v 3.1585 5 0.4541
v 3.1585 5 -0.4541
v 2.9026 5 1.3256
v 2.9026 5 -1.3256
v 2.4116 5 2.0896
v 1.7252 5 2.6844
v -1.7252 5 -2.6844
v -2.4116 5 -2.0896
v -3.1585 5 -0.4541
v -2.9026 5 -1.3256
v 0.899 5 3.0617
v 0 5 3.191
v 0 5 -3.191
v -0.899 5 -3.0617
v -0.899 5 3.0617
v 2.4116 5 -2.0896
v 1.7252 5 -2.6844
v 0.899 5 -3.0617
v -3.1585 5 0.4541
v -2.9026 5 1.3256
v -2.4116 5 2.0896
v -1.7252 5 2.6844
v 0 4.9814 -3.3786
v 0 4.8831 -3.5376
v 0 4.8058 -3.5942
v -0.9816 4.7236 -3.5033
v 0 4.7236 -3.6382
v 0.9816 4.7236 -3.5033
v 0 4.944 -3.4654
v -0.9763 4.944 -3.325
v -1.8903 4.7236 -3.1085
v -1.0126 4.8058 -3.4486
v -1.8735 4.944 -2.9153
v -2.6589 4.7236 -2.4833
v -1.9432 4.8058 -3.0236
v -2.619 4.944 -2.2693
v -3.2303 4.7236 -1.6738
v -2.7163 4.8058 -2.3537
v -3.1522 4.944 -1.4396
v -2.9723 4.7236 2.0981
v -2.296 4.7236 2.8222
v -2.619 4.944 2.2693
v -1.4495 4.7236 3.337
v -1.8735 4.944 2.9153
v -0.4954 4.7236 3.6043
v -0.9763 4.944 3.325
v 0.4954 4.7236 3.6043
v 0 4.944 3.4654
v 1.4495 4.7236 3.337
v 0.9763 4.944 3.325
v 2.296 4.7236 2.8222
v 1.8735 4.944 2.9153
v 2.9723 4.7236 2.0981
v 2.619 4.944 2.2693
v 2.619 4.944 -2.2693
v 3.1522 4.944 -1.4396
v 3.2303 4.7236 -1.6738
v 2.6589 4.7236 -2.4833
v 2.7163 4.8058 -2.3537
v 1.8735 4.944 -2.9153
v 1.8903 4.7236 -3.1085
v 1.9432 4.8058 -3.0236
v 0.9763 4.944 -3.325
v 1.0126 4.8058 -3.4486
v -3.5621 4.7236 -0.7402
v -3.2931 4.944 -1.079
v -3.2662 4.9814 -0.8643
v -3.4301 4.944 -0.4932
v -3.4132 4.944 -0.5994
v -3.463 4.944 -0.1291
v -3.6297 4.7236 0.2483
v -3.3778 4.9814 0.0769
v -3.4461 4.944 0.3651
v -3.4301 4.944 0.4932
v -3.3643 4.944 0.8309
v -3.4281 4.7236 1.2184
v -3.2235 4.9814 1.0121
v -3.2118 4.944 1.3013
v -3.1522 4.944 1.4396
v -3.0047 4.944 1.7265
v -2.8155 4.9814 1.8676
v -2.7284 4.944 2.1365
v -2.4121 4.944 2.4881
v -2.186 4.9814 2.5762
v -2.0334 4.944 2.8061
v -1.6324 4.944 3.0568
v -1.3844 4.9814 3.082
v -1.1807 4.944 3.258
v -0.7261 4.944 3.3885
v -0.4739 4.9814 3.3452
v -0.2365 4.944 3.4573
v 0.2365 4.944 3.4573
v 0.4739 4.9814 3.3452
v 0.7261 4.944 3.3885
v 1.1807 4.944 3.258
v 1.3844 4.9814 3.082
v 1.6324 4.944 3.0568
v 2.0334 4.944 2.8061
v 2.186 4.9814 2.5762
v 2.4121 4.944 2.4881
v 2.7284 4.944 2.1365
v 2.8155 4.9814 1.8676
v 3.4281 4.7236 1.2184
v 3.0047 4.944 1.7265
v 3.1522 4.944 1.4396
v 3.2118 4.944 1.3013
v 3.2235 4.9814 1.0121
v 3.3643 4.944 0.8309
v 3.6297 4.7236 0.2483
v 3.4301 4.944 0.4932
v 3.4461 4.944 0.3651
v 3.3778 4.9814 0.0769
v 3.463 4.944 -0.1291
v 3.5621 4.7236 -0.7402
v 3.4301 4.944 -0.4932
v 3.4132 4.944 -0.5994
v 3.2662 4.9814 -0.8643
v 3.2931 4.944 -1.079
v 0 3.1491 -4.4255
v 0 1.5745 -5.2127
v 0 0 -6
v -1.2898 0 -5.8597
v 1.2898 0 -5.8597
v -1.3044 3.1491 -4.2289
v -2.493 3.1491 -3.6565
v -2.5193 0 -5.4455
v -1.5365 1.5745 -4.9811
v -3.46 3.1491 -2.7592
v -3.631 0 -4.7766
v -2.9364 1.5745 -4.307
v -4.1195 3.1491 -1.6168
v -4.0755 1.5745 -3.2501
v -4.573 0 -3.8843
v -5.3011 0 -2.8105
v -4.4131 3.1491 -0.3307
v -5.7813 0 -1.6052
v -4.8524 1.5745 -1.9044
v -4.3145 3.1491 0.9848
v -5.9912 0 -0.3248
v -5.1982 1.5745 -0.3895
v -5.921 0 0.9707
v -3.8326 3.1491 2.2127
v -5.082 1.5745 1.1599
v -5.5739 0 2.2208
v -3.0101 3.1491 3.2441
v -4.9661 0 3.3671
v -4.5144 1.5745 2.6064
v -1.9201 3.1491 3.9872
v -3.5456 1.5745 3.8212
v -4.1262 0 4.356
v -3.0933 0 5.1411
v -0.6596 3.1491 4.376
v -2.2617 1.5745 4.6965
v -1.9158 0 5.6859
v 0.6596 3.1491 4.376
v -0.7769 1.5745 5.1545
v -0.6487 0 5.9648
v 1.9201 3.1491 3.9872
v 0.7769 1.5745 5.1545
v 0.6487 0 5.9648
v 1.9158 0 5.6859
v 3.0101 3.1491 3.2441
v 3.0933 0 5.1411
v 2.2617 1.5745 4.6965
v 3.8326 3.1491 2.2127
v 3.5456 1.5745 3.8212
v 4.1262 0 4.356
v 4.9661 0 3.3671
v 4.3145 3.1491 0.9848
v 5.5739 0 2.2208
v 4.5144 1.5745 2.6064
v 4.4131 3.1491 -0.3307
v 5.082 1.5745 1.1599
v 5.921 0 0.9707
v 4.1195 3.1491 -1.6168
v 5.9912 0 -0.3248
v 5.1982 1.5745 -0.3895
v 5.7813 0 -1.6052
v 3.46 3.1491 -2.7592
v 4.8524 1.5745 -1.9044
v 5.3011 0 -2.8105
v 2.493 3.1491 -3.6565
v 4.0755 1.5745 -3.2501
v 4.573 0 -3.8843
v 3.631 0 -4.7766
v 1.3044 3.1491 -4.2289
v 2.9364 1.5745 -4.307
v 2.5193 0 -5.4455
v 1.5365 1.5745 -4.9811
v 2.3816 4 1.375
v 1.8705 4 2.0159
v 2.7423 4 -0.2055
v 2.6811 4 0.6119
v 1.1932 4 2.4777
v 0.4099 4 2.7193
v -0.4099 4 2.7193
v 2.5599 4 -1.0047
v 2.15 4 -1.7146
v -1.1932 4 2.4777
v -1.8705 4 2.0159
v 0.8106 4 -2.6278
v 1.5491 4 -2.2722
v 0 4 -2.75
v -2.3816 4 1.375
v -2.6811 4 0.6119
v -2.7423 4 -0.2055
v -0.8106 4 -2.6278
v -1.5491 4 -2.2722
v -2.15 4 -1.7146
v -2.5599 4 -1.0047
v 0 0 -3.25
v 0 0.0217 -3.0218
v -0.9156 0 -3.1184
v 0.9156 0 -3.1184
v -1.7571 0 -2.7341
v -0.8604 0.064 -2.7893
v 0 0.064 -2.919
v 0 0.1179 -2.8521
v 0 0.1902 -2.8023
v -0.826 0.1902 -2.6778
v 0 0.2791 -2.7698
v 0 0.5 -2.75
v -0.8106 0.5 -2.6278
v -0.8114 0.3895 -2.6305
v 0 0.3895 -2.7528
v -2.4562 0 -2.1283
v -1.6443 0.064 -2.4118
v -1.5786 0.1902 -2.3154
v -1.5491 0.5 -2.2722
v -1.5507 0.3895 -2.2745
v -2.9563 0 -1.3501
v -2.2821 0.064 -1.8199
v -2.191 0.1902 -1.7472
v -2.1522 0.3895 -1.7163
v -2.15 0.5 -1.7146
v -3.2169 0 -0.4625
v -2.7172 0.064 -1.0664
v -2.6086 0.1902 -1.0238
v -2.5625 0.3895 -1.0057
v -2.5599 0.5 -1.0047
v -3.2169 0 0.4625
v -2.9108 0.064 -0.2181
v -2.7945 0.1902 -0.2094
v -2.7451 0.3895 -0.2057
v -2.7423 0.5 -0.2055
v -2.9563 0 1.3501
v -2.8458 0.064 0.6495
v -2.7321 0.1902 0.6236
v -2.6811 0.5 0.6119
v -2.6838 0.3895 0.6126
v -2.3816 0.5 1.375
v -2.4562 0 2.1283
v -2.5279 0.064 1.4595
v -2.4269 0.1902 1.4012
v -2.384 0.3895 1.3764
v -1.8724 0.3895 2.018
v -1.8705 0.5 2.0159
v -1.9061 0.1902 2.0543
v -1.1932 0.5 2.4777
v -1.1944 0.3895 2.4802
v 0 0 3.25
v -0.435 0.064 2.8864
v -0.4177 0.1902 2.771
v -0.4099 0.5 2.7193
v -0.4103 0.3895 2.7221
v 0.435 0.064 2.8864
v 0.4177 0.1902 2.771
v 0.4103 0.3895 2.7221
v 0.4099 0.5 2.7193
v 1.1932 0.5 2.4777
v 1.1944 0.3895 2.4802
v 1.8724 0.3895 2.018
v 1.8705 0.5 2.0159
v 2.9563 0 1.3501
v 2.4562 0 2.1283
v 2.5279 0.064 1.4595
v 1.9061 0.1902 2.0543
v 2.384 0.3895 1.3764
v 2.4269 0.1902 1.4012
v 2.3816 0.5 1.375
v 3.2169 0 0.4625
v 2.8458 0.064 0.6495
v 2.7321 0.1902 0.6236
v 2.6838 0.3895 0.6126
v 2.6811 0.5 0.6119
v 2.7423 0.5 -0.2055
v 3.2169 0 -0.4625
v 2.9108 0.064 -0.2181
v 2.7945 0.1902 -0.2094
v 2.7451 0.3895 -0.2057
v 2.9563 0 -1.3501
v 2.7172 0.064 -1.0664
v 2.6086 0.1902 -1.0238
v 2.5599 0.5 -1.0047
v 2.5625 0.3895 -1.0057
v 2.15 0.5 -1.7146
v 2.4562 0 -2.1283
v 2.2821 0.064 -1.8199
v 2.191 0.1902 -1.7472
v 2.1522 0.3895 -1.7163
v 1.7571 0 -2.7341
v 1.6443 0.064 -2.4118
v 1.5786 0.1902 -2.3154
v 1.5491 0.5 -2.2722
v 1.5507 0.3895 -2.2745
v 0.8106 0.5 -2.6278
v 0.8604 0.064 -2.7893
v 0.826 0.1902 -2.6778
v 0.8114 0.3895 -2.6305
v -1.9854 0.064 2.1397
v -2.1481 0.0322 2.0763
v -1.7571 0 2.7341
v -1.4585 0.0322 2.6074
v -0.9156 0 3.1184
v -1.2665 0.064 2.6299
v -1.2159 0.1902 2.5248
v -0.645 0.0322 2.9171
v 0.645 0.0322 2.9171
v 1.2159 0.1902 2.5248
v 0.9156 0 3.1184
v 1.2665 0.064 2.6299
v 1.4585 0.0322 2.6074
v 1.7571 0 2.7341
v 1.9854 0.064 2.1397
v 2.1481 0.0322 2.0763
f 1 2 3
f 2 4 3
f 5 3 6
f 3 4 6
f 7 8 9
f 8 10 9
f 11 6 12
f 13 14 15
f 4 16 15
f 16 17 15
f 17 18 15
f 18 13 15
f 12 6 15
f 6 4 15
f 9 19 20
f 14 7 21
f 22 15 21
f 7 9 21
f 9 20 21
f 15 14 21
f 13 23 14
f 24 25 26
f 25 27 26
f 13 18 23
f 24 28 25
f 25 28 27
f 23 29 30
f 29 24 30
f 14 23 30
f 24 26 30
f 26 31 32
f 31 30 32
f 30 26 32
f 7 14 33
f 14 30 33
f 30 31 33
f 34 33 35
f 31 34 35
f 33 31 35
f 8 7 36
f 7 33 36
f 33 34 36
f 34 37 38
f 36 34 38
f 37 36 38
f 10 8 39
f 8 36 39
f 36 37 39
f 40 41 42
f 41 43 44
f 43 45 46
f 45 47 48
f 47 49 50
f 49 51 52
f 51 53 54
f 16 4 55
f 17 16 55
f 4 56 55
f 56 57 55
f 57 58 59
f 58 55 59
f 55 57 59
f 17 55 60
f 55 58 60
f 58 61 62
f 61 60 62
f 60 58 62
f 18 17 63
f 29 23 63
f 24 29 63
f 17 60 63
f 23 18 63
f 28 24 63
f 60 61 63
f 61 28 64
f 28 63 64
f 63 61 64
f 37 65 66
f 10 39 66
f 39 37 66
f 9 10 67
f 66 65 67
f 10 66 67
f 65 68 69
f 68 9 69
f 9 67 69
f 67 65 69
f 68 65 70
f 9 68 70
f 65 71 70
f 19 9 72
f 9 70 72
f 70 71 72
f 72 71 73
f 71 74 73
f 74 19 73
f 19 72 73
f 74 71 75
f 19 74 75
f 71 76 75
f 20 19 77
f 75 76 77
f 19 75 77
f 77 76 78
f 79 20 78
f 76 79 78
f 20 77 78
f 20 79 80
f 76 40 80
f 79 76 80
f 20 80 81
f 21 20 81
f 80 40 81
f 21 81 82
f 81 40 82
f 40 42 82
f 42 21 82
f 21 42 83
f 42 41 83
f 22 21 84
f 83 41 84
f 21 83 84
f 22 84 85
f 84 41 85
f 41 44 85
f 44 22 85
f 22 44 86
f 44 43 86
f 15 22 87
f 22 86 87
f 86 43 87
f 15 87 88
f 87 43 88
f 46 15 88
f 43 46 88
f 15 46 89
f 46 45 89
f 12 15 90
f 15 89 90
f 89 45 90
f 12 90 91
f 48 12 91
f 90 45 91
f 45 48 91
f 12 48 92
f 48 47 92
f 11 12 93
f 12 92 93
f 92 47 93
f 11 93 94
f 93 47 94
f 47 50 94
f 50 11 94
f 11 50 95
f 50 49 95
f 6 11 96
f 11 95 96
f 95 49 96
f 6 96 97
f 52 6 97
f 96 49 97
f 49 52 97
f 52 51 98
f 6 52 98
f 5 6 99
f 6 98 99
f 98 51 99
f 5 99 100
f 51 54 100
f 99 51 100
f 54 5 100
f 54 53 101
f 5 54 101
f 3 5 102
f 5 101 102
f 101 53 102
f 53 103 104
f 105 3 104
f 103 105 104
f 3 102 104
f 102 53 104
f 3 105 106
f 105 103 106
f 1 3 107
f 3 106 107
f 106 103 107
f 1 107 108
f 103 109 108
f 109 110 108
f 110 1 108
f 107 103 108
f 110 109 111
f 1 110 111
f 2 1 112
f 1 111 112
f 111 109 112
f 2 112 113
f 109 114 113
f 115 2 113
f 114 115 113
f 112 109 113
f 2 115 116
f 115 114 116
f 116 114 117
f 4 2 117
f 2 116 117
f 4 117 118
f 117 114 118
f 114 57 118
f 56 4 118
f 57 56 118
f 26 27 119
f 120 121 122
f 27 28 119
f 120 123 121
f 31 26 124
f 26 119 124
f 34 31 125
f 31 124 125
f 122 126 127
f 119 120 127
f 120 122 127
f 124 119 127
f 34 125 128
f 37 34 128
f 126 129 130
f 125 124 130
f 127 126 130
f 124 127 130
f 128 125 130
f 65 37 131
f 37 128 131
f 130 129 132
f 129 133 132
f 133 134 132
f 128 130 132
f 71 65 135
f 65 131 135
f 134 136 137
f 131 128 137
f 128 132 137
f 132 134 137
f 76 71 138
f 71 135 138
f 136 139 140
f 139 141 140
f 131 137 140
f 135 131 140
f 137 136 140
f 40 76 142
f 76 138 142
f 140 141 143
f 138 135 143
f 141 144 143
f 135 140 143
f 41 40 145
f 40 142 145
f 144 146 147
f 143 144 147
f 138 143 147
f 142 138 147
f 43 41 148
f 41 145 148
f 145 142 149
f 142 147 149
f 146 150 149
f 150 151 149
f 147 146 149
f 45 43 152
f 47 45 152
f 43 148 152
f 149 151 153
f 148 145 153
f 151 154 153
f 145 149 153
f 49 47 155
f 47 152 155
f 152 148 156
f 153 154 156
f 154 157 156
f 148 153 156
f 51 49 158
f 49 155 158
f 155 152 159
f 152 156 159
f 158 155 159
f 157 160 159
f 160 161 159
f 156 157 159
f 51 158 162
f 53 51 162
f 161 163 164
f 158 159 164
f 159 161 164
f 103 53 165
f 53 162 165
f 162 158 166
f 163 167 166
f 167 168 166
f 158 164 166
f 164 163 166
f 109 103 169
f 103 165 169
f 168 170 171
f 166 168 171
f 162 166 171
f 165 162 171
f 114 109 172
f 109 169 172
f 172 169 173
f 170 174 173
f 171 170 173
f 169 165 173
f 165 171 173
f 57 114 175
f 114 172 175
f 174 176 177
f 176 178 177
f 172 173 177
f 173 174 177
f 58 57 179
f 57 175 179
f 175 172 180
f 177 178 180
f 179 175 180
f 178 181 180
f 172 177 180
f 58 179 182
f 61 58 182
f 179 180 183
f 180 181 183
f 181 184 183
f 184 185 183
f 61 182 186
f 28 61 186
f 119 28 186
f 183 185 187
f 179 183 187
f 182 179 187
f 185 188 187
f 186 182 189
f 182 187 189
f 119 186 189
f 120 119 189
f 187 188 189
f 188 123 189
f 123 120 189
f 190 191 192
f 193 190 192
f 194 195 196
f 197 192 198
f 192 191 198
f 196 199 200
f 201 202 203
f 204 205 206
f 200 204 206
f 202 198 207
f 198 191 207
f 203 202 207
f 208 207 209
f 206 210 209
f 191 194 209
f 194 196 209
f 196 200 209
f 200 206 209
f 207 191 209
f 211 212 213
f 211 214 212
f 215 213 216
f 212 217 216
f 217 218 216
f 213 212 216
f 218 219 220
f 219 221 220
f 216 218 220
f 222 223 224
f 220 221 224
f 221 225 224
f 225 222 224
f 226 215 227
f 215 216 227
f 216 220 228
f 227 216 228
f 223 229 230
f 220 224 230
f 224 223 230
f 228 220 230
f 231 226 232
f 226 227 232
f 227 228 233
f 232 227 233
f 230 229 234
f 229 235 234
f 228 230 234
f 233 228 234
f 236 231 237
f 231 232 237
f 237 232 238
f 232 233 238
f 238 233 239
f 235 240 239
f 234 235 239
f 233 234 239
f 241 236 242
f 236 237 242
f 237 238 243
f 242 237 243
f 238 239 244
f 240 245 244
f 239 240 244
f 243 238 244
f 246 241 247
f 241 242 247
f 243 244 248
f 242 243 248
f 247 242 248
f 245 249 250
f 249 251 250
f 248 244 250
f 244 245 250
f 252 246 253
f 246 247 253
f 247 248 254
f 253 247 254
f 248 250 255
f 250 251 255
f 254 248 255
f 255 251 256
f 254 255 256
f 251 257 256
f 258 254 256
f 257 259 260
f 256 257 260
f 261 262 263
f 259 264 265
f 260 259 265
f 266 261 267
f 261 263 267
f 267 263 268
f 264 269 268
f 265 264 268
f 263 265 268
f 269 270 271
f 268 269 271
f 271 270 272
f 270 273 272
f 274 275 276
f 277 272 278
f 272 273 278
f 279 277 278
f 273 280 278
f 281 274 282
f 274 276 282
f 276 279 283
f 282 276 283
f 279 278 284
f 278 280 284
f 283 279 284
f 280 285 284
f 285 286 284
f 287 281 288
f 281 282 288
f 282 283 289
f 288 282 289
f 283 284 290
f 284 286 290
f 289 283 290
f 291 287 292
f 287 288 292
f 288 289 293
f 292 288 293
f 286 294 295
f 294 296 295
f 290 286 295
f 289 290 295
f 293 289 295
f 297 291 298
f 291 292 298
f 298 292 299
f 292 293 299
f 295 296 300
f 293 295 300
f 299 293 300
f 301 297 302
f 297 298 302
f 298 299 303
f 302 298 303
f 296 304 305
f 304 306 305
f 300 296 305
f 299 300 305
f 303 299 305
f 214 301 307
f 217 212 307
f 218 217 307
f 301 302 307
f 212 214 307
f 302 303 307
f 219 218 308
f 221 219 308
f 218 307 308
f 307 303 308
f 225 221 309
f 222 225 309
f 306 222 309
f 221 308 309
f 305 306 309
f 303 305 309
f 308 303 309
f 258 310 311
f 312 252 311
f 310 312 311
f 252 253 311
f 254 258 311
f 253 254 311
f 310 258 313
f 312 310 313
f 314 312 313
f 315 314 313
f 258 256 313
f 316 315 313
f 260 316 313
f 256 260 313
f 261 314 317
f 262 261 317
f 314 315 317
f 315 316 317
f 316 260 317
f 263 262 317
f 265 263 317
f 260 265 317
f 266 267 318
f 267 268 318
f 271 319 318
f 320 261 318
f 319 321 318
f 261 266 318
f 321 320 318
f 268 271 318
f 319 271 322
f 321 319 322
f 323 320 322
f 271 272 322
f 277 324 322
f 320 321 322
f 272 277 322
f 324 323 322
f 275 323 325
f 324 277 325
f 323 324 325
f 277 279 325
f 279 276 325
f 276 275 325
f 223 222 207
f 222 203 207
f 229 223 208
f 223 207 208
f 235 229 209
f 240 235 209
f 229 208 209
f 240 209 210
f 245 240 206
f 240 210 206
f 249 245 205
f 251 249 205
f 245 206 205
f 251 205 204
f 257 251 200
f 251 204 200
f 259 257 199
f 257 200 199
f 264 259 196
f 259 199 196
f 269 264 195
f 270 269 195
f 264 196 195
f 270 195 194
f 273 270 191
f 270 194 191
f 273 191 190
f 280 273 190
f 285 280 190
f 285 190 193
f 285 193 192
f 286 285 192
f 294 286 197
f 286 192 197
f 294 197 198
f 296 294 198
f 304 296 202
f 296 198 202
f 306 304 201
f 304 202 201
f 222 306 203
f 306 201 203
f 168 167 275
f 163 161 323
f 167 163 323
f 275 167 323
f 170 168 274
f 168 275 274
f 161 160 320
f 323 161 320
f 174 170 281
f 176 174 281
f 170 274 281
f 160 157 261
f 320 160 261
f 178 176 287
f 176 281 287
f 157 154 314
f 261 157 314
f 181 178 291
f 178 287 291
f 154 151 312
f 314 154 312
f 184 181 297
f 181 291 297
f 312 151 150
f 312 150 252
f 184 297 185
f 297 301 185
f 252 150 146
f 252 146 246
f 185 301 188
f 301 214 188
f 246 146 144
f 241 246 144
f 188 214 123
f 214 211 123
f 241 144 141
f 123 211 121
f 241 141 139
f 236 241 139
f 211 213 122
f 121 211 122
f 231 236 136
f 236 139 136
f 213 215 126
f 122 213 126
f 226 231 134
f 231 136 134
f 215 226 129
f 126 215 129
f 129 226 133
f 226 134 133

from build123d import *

# Parameters (mm, degrees)
FILLET2_SIZE = 0.5


with BuildPart() as part:
    # Sketch1 → Revolve1 (revolve)
    with BuildSketch(Plane.XY, mode=Mode.PRIVATE) as revolve1_sk:
        Polygon((0, 5), (3.5, 5), (6, 0), (2.75, 0), (2.75, 4), (0, 4), align=None)
    revolve(revolve1_sk.sketch.rotate(Axis((0, 0, 0), (0, 1, 0)), 90), axis=Axis((0, 0, 0), (0, 1, 0)))

    # Fillet1
    # a fillet whose section is not a circle: 0.5 mm, written as the material it takes off along each edge
    with BuildSketch(Plane(origin=(0, 5, 0), x_dir=(0, 0, -1), z_dir=(1, 0, 0))) as fillet1_piece_1:
        with BuildLine():
            add(Edge.make_bspline([(3.190983006, 0), (3.246118173, 0), (3.30125334, 0), (3.424221159, -0.01541979), (3.520097448, -0.074674596), (3.588882209, -0.177764417), (3.613539405, -0.22707881), (3.638196601, -0.276393202)], knots=[0, 0, 0, 0, 0, 0, 0.5, 0.5, 1, 1, 1, 1, 1, 1], degree=5))
            Line((3.638196601, -0.276393202), (3.5, 0))
            Line((3.5, 0), (3.190983006, 0))
        make_face()
    revolve(axis=Axis((0, 5, 0), (0, 1, 0)), mode=Mode.SUBTRACT)

    # Fillet2
    # a fillet whose section is not a circle: 0.5 mm, written as the material it takes off along each edge
    with BuildSketch(Plane(origin=(0, 0, 0), x_dir=(0, 0, -1), z_dir=(1, 0, 0))) as fillet2_piece_1:
        with BuildLine():
            add(Edge.make_bspline([(2.75 + FILLET2_SIZE, 0), (2.75 + FILLET2_SIZE * 0.831801948466, 0), (2.75 + FILLET2_SIZE * 0.663603896932, 0), (2.75 + FILLET2_SIZE * 0.292893218813, FILLET2_SIZE * 0.0716919198361), (2.75 + FILLET2_SIZE * 0.0716919198361, FILLET2_SIZE * 0.292893218813), (2.75, FILLET2_SIZE * 0.663603896932), (2.75, FILLET2_SIZE * 0.831801948466), (2.75, FILLET2_SIZE)], knots=[0, 0, 0, 0, 0, 0, 0.5, 0.5, 1, 1, 1, 1, 1, 1], degree=5))
            Line((2.75, FILLET2_SIZE), (2.75, 0))
            Line((2.75, 0), (2.75 + FILLET2_SIZE, 0))
        make_face()
    revolve(axis=Axis((0, 0, 0), (0, 1, 0)), mode=Mode.SUBTRACT)


solid = part.part
